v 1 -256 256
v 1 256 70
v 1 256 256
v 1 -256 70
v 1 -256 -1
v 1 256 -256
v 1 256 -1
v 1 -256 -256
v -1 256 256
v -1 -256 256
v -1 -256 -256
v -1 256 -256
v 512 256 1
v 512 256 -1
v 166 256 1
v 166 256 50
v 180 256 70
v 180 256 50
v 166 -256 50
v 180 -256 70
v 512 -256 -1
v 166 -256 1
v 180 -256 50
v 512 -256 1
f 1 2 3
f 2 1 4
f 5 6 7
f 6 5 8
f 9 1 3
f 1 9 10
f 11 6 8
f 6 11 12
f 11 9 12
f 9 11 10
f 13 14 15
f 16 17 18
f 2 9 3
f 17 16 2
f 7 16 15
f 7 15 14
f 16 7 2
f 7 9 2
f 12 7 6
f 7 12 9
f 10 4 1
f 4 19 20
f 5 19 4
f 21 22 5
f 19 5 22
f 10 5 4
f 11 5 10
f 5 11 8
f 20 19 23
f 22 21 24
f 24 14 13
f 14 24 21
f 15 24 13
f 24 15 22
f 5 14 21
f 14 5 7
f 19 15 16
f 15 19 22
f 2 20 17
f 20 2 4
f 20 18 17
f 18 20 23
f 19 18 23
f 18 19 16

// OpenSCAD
// 벽
module wall(hilt, blade) {
	assume = [512, 2];
	data = [180, 14, 20, 70];
	colors = [[0.5, 0.5, 0, 0.1],
		[0, 0, 0, 0.8],
		[1, 0, 0, 1]
	];

	// 벽
	color(colors[0]) {
		cube([assume[1], assume[0], assume[0]], center = true);
		translate([assume[0] / 2, 0, 0]) cube([assume[0], assume[0], assume[1]], center = true);
	}
	
	color(colors[1]) translate([(data[0] - data[1]) / 2, 0, data[3] / 2]) cube([data[0] - data[1], assume[0], data[3]], center = true);
	color(colors[1]) translate([data[0] / 2, 0, data[3] - data[2] / 2]) cube([data[0], assume[0], data[2]], center = true);
}

wall();
